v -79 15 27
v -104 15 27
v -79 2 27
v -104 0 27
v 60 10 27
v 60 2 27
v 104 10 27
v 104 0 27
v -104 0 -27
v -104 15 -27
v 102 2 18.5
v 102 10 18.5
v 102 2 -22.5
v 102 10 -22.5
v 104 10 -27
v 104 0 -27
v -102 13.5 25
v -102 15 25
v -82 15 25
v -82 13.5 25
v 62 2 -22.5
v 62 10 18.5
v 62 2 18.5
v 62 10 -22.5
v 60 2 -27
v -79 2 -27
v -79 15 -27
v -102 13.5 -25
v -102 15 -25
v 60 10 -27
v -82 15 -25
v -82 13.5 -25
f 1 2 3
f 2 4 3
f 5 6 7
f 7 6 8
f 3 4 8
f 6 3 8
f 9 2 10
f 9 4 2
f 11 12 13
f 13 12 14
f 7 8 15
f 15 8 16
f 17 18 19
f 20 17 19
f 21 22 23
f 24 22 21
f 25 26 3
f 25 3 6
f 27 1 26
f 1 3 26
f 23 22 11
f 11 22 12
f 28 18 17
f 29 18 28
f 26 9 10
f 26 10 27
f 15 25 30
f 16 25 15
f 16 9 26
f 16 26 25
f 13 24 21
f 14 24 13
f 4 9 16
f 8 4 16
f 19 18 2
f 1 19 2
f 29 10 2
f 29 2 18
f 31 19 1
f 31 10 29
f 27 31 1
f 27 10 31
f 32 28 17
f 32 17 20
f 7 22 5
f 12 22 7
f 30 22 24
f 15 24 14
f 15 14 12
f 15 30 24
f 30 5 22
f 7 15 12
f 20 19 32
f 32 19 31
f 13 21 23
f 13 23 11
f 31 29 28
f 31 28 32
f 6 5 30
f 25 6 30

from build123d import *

# Parameters (mm, degrees)
SKETCH2_W           = 208
SKETCH2_H           = 54
BOSS_EXTRUDE1_DEPTH = 10
SKETCH4_W           = 139
SKETCH4_H           = 54
CUT_EXTRUDE1_DEPTH  = 8
SKETCH3_W           = 40
SKETCH3_H           = 41
CUT_EXTRUDE2_DEPTH  = 8
SKETCH6_W           = 25
SKETCH6_H           = 54
BOSS_EXTRUDE2_DEPTH = 5
SKETCH7_W           = 20
SKETCH7_H           = 50
CUT_EXTRUDE3_DEPTH  = 1.5


with BuildPart() as part:
    # Sketch2 → Boss-Extrude1 (new body)
    with BuildSketch(Plane(origin=(0, 0, 0), x_dir=(1, 0, 0), z_dir=(0, 1, 0))):
        Rectangle(SKETCH2_W, SKETCH2_H)
    extrude(amount=BOSS_EXTRUDE1_DEPTH)

    # Sketch4 → Cut-Extrude1 (cut)
    with BuildSketch(Plane(origin=(0, 10, 0), x_dir=(1, 0, 0), z_dir=(0, 1, 0))):
        with Locations((-9.5, 0)):
            Rectangle(SKETCH4_W, SKETCH4_H)
    extrude(amount=-CUT_EXTRUDE1_DEPTH, mode=Mode.SUBTRACT)

    # Sketch3 → Cut-Extrude2 (cut)
    with BuildSketch(Plane(origin=(0, 10, 0), x_dir=(1, 0, 0), z_dir=(0, 1, 0))):
        with Locations((82, 2)):
            Rectangle(SKETCH3_W, SKETCH3_H)
    extrude(amount=-CUT_EXTRUDE2_DEPTH, mode=Mode.SUBTRACT)

    # Sketch6 → Boss-Extrude2 (add)
    with BuildSketch(Plane(origin=(0, 10, 0), x_dir=(1, 0, 0), z_dir=(0, 1, 0))):
        with Locations((-91.5, 0)):
            Rectangle(SKETCH6_W, SKETCH6_H)
    extrude(amount=BOSS_EXTRUDE2_DEPTH)

    # Sketch7 → Cut-Extrude3 (cut)
    with BuildSketch(Plane(origin=(0, 15, 0), x_dir=(1, 0, 0), z_dir=(0, 1, 0))):
        with Locations((-92, 0)):
            Rectangle(SKETCH7_W, SKETCH7_H)
    extrude(amount=-CUT_EXTRUDE3_DEPTH, mode=Mode.SUBTRACT)


solid = part.part
